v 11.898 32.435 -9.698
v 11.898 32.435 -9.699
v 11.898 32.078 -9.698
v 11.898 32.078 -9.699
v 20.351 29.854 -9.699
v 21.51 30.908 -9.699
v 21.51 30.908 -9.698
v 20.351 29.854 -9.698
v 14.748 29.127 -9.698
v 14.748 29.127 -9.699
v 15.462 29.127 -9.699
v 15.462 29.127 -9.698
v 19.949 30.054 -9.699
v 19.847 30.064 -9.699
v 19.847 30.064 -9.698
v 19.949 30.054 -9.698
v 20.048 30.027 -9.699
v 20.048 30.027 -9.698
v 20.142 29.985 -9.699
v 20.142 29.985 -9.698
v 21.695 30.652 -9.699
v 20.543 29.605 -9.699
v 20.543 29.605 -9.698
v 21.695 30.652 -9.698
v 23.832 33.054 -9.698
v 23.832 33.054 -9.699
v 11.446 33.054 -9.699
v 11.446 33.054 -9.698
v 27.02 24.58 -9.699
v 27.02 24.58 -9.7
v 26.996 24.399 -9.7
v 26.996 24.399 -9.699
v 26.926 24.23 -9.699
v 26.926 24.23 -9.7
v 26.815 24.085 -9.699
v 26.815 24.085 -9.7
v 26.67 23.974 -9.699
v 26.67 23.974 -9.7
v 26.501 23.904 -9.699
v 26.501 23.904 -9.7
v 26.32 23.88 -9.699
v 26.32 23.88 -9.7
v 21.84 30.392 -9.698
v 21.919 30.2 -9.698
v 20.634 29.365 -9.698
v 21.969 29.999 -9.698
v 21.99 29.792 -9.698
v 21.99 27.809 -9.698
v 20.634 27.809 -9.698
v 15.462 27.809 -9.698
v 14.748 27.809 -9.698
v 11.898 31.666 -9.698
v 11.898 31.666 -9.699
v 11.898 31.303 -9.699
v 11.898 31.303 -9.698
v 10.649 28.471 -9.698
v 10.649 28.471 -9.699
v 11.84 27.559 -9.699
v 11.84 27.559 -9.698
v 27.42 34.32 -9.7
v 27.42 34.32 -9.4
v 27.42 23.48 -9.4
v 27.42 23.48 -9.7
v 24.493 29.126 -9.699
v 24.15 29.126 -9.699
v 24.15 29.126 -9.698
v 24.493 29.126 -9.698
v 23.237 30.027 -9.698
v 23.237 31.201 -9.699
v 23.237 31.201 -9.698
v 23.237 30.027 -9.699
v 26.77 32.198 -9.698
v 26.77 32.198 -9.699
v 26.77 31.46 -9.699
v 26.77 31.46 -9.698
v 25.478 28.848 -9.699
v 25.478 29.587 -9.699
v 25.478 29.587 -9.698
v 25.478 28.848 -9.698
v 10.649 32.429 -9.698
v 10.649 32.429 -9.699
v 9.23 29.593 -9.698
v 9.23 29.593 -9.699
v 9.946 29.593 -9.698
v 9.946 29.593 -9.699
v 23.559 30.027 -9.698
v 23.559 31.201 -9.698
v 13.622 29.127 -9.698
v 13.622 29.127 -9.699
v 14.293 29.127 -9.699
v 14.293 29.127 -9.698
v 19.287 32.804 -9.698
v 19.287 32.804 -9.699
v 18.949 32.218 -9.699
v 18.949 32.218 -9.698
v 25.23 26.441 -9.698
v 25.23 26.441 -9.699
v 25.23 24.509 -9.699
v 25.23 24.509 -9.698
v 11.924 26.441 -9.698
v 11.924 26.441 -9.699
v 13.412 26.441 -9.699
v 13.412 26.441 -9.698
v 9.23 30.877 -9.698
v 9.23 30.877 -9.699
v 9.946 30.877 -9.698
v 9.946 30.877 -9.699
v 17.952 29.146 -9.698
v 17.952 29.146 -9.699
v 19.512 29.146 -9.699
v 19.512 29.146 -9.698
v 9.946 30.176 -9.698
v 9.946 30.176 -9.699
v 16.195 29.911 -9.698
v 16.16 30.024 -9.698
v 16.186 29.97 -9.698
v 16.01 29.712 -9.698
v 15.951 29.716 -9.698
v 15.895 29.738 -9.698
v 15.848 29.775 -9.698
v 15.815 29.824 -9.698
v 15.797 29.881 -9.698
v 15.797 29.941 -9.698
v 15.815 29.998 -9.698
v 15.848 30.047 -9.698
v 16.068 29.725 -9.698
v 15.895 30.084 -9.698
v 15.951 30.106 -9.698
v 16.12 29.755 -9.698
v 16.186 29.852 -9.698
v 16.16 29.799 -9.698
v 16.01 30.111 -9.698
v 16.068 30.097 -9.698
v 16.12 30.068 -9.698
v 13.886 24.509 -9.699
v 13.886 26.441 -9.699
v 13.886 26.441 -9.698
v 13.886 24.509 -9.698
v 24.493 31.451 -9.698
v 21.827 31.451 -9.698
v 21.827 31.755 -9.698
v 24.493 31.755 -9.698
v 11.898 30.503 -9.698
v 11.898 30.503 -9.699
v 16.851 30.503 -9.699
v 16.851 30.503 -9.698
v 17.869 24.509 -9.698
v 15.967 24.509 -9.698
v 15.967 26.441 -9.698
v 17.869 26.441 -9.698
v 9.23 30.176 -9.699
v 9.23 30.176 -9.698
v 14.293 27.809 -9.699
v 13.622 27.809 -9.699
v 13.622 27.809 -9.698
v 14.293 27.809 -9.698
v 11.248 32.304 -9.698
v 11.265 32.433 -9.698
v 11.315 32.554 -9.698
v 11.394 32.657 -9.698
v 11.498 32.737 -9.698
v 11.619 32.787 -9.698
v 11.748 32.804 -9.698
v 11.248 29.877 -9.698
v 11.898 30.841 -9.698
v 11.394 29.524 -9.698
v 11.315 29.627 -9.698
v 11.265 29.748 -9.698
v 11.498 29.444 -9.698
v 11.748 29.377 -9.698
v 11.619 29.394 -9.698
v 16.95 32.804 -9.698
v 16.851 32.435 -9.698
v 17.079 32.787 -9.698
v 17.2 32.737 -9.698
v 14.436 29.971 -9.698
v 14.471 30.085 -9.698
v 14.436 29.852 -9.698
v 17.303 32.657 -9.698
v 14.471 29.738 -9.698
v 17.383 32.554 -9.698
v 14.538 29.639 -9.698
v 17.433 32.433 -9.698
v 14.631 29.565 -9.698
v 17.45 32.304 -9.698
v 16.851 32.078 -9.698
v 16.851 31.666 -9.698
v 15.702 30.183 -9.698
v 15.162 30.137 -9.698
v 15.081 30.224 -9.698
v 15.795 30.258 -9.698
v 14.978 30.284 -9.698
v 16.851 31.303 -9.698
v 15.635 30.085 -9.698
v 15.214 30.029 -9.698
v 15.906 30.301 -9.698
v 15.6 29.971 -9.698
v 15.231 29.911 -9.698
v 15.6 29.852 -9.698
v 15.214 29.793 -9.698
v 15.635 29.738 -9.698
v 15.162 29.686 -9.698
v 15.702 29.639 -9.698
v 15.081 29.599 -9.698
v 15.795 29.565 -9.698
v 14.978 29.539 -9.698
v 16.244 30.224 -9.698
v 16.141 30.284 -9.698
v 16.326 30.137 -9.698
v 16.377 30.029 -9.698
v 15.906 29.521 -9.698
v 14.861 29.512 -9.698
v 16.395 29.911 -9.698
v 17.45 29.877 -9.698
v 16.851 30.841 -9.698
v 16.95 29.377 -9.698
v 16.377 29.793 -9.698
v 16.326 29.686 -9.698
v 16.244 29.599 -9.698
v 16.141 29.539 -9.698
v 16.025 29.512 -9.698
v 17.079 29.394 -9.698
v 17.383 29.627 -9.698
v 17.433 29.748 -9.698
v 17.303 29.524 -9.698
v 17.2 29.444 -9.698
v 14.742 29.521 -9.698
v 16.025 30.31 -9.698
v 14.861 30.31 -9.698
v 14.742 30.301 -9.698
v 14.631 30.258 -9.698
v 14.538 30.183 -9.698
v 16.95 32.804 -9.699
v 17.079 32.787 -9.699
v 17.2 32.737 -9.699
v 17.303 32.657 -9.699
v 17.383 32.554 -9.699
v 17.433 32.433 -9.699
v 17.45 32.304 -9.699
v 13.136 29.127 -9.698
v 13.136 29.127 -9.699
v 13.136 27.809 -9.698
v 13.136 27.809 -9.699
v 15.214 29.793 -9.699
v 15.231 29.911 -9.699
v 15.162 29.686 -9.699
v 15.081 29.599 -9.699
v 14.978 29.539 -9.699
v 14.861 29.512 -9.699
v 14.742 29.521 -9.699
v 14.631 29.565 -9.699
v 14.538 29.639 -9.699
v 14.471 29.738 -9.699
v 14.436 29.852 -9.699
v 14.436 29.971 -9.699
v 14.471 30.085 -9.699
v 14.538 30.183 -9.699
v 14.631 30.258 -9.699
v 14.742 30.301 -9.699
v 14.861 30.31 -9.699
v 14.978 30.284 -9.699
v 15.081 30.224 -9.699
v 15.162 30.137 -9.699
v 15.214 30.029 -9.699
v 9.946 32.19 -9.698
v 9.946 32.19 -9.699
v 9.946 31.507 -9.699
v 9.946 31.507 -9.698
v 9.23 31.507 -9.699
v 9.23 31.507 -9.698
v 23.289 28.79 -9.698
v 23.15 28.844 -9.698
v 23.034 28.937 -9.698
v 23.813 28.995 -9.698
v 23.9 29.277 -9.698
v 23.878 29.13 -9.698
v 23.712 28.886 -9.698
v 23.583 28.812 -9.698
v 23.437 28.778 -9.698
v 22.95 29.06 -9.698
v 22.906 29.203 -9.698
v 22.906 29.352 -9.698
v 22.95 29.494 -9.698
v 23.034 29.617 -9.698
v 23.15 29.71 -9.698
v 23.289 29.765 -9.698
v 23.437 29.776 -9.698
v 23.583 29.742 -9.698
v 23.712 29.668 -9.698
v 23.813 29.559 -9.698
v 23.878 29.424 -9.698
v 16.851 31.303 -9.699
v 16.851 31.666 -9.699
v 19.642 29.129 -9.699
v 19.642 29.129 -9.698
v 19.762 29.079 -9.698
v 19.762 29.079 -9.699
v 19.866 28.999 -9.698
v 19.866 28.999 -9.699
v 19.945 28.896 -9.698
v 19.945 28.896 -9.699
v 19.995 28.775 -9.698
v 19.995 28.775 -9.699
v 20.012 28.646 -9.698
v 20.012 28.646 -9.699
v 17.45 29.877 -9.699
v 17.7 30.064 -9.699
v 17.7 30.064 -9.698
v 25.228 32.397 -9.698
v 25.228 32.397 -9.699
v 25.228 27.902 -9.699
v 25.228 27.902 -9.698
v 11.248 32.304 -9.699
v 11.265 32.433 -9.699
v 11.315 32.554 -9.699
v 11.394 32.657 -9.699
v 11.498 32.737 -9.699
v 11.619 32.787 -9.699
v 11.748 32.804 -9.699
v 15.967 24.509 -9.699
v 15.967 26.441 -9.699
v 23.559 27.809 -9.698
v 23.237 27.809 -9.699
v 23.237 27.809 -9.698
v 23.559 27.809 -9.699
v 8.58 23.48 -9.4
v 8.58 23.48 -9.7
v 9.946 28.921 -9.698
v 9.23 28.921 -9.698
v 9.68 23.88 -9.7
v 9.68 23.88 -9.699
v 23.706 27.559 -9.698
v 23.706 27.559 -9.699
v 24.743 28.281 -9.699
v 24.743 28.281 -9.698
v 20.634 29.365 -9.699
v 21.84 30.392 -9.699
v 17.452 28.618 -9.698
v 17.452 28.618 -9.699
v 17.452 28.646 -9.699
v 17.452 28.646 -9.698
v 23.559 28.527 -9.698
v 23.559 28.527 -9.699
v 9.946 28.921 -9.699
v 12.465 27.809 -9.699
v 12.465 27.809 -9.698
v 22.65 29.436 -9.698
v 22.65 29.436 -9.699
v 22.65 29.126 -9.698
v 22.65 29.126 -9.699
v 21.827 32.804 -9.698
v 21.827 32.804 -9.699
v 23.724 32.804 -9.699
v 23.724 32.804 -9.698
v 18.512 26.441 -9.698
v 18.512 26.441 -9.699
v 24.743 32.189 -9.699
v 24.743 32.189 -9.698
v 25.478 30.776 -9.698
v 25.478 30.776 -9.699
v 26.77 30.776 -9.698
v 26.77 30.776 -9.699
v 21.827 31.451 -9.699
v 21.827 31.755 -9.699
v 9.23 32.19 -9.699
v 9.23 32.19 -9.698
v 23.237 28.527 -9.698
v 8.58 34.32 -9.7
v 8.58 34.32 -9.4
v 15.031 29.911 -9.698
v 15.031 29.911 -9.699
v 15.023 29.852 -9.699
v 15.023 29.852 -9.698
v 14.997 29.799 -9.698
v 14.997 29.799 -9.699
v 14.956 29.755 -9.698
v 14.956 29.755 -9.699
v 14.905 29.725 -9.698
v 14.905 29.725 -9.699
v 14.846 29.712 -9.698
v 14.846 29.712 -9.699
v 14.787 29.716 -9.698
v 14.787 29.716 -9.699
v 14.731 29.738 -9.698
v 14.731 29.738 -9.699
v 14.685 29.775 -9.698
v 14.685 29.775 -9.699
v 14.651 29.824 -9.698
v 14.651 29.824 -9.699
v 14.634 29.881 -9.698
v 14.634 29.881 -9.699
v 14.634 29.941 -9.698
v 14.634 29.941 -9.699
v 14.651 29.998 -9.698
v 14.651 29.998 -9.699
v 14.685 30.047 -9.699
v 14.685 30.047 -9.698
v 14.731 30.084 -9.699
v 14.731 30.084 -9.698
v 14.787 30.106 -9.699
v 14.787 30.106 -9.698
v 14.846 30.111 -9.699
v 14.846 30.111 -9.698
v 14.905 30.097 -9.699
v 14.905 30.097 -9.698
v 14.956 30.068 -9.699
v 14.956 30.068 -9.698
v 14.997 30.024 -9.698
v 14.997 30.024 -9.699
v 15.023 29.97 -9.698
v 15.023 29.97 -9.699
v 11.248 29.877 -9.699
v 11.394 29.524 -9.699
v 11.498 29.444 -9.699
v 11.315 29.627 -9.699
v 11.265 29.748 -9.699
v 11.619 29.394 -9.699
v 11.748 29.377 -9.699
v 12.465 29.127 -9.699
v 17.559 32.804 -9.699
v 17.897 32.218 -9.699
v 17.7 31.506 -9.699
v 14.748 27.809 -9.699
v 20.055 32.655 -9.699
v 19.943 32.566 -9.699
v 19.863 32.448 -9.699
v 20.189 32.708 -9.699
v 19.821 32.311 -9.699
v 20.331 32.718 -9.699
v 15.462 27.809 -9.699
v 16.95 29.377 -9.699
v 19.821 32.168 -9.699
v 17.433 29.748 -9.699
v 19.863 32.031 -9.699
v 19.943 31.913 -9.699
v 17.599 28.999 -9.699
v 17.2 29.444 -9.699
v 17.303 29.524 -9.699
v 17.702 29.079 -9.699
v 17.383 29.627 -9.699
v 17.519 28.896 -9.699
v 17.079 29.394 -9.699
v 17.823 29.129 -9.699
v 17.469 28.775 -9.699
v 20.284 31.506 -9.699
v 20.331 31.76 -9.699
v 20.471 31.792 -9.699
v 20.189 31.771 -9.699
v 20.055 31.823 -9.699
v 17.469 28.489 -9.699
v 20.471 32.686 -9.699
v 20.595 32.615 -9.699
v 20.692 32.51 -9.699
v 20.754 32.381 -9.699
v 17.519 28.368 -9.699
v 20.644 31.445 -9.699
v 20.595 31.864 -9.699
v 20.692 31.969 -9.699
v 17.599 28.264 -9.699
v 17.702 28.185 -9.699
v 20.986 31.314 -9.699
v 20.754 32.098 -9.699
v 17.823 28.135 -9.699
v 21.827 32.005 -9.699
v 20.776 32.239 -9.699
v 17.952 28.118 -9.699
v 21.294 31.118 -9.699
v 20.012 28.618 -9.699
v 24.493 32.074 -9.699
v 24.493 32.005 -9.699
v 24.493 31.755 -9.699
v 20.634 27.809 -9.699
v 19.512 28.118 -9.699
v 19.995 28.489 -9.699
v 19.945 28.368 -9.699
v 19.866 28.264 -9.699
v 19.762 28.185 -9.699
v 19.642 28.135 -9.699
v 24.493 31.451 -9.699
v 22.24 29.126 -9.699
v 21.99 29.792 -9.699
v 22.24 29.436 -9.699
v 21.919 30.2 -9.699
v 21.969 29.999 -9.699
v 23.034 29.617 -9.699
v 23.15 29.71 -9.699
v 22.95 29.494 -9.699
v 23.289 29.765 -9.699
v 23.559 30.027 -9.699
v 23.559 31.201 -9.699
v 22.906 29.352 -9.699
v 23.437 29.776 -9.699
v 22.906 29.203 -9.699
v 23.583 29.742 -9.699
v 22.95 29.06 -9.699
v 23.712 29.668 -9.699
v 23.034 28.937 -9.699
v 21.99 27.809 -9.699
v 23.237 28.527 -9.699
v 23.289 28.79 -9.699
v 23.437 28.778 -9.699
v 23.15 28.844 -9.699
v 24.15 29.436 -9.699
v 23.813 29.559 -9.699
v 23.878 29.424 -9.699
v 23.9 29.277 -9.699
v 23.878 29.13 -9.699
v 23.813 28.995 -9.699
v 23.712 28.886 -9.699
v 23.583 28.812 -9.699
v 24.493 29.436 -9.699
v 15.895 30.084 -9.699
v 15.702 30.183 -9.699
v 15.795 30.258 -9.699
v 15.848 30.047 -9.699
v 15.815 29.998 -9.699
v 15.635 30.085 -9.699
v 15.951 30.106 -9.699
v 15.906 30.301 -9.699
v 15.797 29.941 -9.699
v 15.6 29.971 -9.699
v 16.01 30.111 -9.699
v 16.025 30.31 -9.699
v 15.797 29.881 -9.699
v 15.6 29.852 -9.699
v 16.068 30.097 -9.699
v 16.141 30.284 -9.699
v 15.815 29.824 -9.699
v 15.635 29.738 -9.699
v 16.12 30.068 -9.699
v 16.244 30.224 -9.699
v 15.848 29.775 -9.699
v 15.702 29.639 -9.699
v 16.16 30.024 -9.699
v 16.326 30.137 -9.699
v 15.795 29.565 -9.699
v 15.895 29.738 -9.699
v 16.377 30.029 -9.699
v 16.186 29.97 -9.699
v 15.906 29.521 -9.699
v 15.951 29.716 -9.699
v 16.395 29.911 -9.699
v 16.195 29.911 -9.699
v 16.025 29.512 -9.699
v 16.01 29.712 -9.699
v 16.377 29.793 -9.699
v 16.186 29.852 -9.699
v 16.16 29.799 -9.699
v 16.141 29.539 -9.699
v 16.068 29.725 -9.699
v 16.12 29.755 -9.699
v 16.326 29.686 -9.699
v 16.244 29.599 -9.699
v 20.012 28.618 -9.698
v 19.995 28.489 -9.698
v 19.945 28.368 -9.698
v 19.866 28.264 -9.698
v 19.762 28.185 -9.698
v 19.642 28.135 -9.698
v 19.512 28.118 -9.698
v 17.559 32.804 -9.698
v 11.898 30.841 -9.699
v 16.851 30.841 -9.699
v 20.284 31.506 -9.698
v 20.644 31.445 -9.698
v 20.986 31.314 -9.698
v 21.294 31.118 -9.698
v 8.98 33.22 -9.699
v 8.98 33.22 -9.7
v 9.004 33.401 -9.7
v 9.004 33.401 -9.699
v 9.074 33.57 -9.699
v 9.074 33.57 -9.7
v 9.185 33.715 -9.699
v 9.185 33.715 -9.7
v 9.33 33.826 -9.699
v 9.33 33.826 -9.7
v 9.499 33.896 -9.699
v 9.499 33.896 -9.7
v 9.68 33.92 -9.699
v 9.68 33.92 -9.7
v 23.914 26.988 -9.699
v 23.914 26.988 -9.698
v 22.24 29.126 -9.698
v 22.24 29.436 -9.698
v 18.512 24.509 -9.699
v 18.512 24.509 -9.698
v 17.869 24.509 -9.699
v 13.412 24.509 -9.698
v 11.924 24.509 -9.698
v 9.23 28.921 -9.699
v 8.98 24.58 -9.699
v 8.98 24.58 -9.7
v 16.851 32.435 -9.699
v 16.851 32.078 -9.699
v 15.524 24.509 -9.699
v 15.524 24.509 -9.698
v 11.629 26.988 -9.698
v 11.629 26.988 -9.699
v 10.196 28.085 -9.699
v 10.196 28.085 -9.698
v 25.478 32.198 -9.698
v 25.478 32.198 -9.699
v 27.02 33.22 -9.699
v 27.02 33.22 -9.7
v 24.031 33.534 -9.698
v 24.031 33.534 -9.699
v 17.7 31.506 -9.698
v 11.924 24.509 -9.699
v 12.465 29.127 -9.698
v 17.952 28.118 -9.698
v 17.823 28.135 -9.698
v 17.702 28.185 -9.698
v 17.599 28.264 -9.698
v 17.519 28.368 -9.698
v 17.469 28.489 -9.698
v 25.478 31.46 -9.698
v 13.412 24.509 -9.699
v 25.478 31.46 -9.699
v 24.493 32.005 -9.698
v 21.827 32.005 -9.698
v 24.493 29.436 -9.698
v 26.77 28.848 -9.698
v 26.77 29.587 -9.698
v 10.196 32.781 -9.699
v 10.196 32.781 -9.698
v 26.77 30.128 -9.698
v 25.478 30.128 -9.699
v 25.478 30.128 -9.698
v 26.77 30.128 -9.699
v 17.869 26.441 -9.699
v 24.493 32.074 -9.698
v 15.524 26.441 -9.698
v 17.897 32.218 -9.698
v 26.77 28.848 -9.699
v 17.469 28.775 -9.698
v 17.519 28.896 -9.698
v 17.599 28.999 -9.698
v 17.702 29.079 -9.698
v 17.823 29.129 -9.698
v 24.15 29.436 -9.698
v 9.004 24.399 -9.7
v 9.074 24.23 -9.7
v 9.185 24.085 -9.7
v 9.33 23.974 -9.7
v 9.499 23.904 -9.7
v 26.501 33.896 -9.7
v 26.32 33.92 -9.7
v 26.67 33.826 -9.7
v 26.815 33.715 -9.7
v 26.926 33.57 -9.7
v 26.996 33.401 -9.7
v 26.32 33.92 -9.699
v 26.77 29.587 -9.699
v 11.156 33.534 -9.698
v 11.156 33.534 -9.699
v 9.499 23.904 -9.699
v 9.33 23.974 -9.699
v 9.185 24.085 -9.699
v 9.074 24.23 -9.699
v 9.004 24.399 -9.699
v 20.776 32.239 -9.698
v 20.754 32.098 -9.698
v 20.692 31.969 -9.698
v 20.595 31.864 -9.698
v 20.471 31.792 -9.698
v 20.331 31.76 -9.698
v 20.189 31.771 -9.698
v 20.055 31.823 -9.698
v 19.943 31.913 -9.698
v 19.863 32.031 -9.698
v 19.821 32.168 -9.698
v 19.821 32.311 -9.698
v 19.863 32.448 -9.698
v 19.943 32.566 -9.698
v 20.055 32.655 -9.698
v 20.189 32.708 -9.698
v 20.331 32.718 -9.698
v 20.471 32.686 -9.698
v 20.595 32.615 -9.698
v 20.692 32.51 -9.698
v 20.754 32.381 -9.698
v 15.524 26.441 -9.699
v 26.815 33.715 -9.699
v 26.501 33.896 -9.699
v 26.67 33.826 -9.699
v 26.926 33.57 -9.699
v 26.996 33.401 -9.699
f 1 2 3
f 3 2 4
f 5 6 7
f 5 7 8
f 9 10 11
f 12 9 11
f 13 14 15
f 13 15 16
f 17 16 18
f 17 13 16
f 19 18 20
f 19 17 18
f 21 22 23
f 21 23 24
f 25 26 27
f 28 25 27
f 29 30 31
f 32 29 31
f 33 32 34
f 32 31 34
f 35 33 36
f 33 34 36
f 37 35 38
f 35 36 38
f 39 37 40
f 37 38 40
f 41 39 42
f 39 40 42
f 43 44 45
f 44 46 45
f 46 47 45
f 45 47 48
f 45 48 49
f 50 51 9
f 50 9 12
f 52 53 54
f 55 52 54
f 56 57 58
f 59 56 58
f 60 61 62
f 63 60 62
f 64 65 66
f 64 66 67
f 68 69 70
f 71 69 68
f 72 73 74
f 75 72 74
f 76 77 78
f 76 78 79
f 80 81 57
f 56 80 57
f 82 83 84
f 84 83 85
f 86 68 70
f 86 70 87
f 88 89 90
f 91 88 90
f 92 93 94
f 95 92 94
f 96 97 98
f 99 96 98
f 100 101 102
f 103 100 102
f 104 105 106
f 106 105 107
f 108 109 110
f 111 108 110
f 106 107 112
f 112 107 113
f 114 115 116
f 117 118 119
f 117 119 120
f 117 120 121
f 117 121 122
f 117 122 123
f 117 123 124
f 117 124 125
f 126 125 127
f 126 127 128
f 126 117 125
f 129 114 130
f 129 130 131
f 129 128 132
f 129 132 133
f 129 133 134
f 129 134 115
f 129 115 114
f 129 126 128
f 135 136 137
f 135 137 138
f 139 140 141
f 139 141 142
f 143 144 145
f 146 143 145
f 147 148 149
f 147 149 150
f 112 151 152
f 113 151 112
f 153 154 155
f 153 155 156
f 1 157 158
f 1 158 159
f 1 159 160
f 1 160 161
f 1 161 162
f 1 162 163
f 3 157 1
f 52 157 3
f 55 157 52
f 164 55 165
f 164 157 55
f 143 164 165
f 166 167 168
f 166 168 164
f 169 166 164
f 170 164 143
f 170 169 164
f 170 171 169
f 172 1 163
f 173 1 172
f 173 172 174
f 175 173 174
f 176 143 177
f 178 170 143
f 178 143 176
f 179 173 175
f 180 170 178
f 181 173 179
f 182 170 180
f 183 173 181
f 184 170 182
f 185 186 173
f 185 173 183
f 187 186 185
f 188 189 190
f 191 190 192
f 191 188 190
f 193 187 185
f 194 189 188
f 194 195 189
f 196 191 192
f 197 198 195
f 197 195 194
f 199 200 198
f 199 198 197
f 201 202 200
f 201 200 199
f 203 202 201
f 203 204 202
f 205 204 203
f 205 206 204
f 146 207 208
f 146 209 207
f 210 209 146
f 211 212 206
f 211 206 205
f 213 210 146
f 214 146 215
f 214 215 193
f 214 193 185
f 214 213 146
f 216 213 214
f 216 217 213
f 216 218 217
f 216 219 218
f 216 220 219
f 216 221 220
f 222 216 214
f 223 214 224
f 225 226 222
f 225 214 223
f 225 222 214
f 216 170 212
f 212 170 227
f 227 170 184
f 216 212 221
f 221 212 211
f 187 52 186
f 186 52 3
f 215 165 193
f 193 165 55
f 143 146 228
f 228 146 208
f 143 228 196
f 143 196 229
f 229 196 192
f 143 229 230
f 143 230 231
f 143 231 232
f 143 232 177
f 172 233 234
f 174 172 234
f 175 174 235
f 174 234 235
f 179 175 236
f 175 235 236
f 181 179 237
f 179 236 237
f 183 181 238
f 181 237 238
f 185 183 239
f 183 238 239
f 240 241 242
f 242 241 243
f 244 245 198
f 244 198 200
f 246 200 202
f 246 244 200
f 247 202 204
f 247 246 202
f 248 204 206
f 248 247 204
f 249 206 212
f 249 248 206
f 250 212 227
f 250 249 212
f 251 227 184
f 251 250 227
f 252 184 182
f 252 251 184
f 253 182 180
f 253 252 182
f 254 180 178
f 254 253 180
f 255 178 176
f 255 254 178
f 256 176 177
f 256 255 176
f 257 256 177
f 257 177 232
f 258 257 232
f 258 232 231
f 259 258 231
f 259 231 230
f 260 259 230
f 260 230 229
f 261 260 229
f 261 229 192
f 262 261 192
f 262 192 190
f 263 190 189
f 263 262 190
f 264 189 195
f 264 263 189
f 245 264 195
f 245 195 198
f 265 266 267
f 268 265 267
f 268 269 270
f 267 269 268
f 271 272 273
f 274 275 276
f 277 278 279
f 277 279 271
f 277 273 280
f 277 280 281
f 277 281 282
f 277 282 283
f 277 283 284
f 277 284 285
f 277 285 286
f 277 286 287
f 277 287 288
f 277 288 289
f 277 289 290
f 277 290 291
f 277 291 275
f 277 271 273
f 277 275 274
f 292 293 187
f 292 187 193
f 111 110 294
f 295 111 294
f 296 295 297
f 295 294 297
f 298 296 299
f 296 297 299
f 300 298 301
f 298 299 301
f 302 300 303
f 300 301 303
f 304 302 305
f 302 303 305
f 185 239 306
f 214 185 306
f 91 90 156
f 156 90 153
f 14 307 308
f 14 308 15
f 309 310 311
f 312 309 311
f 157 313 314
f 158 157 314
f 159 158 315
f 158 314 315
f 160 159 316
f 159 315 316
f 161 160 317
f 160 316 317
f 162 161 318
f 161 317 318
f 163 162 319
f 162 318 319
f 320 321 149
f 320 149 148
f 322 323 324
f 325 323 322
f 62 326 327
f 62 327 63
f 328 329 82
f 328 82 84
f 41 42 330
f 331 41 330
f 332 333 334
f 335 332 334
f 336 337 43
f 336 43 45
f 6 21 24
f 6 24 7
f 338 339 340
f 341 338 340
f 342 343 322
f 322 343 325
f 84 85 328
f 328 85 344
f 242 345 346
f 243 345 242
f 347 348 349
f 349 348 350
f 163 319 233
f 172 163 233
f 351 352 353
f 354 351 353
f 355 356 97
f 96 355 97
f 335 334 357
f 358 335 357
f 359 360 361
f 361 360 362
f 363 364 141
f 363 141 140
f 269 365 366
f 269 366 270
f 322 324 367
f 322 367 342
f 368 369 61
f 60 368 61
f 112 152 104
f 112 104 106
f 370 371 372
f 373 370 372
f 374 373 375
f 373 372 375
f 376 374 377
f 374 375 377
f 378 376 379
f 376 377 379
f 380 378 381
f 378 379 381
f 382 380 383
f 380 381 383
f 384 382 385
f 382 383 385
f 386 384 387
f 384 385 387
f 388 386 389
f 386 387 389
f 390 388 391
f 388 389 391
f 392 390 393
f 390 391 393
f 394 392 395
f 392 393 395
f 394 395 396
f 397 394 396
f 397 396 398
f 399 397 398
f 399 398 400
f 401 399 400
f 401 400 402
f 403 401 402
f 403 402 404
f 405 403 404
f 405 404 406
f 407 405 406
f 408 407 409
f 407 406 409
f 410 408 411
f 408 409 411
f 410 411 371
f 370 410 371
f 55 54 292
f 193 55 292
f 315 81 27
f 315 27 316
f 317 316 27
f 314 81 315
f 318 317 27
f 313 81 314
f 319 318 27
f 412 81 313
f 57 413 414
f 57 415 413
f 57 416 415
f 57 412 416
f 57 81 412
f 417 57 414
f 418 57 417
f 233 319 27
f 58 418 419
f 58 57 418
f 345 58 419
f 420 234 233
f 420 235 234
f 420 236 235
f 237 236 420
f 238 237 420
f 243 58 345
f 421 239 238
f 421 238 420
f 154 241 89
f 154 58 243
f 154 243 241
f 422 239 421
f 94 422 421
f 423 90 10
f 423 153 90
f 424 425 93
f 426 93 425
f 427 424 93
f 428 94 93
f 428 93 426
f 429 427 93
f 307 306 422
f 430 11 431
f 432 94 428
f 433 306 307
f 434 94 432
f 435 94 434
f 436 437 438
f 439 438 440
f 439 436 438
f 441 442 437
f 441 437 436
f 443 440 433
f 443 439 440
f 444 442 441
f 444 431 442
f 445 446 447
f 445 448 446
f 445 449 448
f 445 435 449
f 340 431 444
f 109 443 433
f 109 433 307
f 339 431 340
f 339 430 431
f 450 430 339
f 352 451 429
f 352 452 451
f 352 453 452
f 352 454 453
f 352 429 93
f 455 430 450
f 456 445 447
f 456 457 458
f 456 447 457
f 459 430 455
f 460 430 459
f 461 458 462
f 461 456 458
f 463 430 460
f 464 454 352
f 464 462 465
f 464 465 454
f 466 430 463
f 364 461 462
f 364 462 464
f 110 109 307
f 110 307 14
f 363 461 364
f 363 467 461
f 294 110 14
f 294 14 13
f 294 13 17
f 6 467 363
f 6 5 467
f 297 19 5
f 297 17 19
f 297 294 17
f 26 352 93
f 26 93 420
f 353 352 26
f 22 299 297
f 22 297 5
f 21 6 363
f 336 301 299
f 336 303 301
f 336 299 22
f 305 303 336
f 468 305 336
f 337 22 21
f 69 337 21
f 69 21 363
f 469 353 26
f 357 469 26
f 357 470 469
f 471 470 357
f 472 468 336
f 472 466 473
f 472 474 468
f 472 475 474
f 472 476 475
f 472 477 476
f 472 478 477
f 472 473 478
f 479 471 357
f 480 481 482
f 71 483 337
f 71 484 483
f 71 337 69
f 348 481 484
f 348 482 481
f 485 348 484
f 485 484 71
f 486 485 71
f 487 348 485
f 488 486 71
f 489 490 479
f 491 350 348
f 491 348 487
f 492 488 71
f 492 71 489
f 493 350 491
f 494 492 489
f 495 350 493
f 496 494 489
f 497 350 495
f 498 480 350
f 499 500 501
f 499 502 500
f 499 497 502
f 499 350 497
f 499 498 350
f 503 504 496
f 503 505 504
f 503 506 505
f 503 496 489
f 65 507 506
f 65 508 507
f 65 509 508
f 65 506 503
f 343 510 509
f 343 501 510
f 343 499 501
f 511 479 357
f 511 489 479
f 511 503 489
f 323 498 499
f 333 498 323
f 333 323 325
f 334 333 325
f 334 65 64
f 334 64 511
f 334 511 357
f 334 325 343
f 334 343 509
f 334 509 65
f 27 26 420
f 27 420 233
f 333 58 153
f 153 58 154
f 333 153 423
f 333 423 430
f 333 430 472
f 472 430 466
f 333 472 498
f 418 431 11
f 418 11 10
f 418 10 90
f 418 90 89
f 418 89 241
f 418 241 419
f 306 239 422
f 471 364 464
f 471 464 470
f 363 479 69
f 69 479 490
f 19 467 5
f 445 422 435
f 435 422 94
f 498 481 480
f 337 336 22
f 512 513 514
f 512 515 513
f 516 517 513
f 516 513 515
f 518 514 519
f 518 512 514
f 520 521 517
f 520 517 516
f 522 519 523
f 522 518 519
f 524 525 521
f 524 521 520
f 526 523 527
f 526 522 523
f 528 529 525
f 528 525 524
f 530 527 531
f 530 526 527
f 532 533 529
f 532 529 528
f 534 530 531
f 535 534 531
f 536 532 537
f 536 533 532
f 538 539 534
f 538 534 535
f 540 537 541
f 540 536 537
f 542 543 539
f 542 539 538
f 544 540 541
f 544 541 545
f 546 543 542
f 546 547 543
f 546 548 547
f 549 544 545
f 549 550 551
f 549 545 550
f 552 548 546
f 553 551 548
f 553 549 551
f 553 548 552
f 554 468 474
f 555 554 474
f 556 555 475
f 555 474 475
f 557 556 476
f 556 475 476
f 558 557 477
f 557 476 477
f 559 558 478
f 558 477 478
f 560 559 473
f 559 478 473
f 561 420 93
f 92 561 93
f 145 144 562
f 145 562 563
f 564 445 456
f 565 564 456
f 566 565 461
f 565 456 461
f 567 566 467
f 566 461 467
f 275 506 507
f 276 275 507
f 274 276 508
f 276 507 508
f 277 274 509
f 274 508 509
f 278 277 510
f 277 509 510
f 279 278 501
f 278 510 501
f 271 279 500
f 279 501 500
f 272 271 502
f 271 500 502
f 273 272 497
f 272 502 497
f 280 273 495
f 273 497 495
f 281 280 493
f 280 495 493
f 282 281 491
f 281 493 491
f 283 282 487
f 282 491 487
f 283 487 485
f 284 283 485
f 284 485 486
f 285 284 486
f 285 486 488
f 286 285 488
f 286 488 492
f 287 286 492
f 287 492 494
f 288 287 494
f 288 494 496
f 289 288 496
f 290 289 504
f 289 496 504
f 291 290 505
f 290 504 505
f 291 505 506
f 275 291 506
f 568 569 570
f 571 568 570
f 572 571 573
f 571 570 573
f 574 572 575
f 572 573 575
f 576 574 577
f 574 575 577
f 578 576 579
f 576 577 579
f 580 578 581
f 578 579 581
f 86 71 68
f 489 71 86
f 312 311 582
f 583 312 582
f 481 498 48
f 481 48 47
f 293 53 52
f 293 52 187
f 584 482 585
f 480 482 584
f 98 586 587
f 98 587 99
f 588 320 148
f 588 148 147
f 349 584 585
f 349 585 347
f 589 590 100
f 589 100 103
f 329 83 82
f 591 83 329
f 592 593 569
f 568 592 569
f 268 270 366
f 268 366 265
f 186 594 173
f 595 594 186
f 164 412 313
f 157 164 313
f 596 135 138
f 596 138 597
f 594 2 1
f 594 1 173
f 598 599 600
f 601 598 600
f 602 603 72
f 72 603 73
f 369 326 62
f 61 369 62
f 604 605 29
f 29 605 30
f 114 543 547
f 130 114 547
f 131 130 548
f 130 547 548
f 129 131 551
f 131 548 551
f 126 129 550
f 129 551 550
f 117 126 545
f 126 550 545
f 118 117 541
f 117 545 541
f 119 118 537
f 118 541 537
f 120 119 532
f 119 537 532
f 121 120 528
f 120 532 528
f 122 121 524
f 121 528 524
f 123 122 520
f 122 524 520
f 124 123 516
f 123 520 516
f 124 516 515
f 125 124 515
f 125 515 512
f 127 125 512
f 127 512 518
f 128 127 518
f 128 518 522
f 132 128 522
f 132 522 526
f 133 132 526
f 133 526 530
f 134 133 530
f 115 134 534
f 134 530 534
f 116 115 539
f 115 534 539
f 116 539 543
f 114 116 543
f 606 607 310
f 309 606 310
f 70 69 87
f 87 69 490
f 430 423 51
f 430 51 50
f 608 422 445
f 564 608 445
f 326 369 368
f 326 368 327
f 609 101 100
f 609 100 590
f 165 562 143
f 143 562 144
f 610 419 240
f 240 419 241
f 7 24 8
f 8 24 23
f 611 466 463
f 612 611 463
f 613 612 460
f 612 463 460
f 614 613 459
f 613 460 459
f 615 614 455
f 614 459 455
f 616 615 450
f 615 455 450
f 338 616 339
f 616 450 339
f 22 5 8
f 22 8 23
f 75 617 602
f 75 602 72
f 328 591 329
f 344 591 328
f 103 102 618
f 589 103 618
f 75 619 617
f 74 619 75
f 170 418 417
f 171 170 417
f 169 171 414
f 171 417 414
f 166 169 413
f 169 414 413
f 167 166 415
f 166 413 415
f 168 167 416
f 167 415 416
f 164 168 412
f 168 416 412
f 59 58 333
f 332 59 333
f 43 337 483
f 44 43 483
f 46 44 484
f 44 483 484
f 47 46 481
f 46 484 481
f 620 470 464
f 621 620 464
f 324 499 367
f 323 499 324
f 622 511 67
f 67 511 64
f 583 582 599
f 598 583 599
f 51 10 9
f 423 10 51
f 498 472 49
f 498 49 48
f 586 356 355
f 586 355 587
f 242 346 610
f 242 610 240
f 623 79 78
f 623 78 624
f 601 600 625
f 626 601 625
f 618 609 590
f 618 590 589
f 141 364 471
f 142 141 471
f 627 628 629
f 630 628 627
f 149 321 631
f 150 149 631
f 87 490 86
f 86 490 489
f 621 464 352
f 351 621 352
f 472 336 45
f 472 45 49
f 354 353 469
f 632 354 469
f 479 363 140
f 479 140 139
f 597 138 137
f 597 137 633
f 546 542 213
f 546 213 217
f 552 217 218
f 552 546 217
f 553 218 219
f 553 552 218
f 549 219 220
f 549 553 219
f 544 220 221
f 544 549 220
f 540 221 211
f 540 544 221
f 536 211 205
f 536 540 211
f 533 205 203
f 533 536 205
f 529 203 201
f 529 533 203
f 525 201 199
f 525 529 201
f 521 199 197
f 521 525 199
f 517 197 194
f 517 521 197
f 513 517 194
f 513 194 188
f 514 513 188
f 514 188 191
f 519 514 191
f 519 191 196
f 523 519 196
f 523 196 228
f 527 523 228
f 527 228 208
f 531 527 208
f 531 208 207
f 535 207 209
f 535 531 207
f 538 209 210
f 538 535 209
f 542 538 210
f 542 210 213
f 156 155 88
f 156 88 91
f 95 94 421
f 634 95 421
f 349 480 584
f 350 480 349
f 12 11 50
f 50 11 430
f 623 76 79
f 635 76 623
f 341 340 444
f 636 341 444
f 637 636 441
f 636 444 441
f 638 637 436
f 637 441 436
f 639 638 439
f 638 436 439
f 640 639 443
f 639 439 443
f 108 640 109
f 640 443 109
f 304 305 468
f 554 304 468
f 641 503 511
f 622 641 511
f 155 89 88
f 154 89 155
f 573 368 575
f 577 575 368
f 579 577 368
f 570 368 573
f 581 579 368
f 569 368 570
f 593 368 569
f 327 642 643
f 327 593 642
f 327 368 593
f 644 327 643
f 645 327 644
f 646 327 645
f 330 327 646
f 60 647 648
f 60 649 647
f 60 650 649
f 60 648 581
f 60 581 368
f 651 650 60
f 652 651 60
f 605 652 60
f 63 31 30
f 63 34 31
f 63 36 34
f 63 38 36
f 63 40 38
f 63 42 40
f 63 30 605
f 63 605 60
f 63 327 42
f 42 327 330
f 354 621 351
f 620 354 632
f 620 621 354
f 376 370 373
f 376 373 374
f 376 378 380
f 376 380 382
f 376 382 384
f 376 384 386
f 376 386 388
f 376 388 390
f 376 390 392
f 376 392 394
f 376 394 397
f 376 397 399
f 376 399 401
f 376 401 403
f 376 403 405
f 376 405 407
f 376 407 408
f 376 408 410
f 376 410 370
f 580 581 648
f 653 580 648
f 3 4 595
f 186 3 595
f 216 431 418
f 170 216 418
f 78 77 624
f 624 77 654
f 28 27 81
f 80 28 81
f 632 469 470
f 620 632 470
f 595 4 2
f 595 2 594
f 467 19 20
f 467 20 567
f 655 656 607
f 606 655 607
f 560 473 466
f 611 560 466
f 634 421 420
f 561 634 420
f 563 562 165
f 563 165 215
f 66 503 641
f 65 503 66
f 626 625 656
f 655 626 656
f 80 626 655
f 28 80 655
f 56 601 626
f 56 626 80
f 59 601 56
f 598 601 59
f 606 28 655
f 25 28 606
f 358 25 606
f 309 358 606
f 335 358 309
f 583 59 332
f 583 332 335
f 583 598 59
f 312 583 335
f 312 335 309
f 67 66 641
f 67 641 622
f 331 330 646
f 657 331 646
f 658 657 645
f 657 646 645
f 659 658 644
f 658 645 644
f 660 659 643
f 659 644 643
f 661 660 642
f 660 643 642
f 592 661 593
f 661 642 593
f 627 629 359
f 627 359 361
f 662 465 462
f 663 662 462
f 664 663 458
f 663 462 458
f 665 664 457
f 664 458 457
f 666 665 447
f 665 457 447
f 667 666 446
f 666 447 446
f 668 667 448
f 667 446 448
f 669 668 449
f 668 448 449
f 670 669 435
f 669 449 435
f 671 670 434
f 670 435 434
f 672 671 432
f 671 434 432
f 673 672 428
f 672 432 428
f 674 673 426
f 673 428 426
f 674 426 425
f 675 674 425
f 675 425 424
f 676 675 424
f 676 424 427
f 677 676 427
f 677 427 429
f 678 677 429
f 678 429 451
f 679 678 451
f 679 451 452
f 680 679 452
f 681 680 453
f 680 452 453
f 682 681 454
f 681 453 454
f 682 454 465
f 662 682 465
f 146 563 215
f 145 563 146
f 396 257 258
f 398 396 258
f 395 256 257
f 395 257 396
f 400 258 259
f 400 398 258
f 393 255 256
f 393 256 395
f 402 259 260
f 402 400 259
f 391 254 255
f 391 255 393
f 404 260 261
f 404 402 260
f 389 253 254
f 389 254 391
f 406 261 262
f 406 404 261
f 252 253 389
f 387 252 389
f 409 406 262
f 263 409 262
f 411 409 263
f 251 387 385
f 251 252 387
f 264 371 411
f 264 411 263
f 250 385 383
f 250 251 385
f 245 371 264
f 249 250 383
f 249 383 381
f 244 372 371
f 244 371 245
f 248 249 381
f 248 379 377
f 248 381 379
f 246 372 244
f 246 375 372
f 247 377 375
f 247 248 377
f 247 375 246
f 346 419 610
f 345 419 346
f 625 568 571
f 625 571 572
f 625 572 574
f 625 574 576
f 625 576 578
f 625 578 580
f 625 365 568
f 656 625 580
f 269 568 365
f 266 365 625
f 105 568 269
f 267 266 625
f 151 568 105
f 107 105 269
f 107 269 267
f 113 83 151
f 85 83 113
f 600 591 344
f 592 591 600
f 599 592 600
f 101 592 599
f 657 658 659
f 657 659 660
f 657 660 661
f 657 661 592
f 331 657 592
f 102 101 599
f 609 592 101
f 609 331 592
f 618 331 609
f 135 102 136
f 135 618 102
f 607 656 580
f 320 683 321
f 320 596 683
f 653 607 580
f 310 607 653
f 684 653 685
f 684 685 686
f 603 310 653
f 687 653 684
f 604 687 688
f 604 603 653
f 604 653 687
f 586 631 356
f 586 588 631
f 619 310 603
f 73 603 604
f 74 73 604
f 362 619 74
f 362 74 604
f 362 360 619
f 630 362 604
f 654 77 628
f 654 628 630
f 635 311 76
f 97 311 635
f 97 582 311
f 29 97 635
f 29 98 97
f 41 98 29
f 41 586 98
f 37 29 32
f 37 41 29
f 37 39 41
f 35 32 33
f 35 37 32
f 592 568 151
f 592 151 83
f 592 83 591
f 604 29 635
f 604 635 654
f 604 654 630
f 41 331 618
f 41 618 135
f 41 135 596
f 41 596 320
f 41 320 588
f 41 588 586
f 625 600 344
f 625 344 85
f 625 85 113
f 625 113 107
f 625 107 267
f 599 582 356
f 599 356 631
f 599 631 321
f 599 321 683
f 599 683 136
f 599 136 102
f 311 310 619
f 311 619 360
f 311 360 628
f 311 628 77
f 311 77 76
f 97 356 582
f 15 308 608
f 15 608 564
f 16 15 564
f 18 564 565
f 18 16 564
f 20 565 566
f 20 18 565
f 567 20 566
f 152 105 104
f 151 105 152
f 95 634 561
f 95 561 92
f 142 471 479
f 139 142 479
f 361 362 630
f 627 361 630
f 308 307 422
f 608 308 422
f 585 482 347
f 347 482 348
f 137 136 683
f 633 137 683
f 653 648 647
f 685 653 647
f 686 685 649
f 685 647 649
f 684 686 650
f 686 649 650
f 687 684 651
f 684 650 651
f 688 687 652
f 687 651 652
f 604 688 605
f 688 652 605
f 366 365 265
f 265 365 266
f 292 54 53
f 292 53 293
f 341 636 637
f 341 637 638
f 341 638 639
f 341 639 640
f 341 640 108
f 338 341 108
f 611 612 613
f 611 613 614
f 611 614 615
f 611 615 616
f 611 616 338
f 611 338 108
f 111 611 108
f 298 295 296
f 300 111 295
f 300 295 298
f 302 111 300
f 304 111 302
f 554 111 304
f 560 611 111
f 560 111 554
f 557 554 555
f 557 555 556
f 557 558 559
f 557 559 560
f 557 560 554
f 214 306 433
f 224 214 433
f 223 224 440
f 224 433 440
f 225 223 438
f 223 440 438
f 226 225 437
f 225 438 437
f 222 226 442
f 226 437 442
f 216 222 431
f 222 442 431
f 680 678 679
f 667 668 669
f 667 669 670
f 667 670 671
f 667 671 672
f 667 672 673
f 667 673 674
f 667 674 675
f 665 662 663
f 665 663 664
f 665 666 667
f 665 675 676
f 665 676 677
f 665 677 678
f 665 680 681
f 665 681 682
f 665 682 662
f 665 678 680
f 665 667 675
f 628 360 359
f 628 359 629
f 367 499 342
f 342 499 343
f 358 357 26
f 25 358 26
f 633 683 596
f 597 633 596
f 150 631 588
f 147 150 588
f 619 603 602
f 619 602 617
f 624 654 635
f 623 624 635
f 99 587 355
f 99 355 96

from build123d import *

# Parameters (mm, degrees)
SKETCH_W        = 18.84
SKETCH_H        = 10.84
PAD_DEPTH       = 0.3
POCKET001_DEPTH = 0.001
SKETCH002_W     = 1.487973
SKETCH002_H     = 1.931914
SKETCH002_W_2   = 1.638274
SKETCH002_W_3   = 1.9013
SKETCH002_W_4   = 6.718428
SKETCH002_W_5   = 0.715697
SKETCH002_H_2   = 0.671803
SKETCH002_H_3   = 0.701418
SKETCH002_H_4   = 0.682957
SKETCH002_W_6   = 1.291878
SKETCH002_H_5   = 0.738334
SKETCH002_H_6   = 0.6481
POCKET002_DEPTH = 0.001
SKETCH003_R     = 0.480256
SKETCH003_R_2   = 0.5
SKETCH003_W     = 0.670654
SKETCH003_H     = 1.317879
SKETCH003_W_2   = 0.670653
SKETCH003_W_3   = 0.713723
SKETCH003_R_3   = 0.4
SKETCH003_W_4   = 4.952994
SKETCH003_H_2   = 0.338404
SKETCH003_H_3   = 0.363017
SKETCH003_H_4   = 0.356861
SKETCH003_W_5   = 0.41034
SKETCH003_H_5   = 0.309326
SKETCH003_W_6   = 0.32158
SKETCH003_H_6   = 1.173725
SKETCH003_W_7   = 0.342889
SKETCH003_H_7   = 0.717704
SKETCH003_W_8   = 2.66577
SKETCH003_H_8   = 0.304358
SKETCH003_R_4   = 0.2
POCKET003_DEPTH = 0.001


with BuildPart() as part:
    # Sketch (on Face1 of Binder) → Pad (new body)
    with BuildSketch(Plane(origin=(0, 0, -9.4), x_dir=(1, 0, 0), z_dir=(0, 0, -1))):
        with Locations((18, -28.9)):
            Rectangle(SKETCH_W, SKETCH_H)
    extrude(amount=PAD_DEPTH)

    # Sketch001 (on Face6 of Pad) → Pocket001 (cut)
    with BuildSketch(Plane(origin=(0, 0, -9.7), x_dir=(1, 0, 0), z_dir=(0, 0, -1))):
        with BuildLine():
            Line((8.98, -24.58), (8.98, -33.22))
            ThreePointArc((8.98, -33.22), (9.185025, -33.714975), (9.68, -33.92))
            Line((9.68, -33.92), (26.32, -33.92))
            ThreePointArc((26.32, -33.92), (26.814975, -33.714975), (27.02, -33.22))
            Line((27.02, -33.22), (27.02, -24.58))
            ThreePointArc((27.02, -24.58), (26.814975, -24.085025), (26.32, -23.88))
            Line((26.32, -23.88), (9.68, -23.88))
            ThreePointArc((9.68, -23.88), (9.185025, -24.085025), (8.98, -24.58))
        make_face()
    extrude(amount=-POCKET001_DEPTH, mode=Mode.SUBTRACT)

    # Sketch002 (on Face15 of Pocket001) → Pocket002 (cut)
    with BuildSketch(Plane(origin=(0, 0, -9.699), x_dir=(1, 0, 0), z_dir=(0, 0, -1))):
        with Locations((12.668276, -25.475131)):
            Rectangle(SKETCH002_W, SKETCH002_H)
        with Locations((14.704847, -25.475131)):
            Rectangle(SKETCH002_W_2, SKETCH002_H)
        with Locations((16.91802, -25.475131)):
            Rectangle(SKETCH002_W_3, SKETCH002_H)
        with Locations((21.871041, -25.475131)):
            Rectangle(SKETCH002_W_4, SKETCH002_H)
        with Locations((9.587848, -29.256862)):
            Rectangle(SKETCH002_W_5, SKETCH002_H_2)
        with Locations((9.587848, -30.52661)):
            Rectangle(SKETCH002_W_5, SKETCH002_H_3)
        with Locations((9.587848, -31.848242)):
            Rectangle(SKETCH002_W_5, SKETCH002_H_4)
        with Locations((26.124061, -29.217495)):
            Rectangle(SKETCH002_W_6, SKETCH002_H_5)
        with Locations((26.124061, -30.452157)):
            Rectangle(SKETCH002_W_6, SKETCH002_H_6)
        with Locations((26.124061, -31.829052)):
            Rectangle(SKETCH002_W_6, SKETCH002_H_5)
        Polygon((10.195697, -28.084638), (10.195697, -32.780541), (11.156489, -33.534092), (24.030916, -33.534092), (25.228122, -32.397384), (25.228122, -27.902392), (23.914452, -26.988171), (11.628569, -26.988171), align=None)
        Polygon((10.649023, -28.470931), (11.840284, -27.55935), (23.706315, -27.55935), (24.742934, -28.280763), (24.742934, -32.189171), (23.832297, -33.053791), (11.445835, -33.053791), (10.649023, -32.428849), align=None, mode=Mode.SUBTRACT)
    extrude(amount=-POCKET002_DEPTH, mode=Mode.SUBTRACT)

    # Sketch003 (on Face83 of Pocket002) → Pocket003 (cut)
    with BuildSketch(Plane(origin=(0, 0, -9.699), x_dir=(1, 0, 0), z_dir=(0, 0, -1))):
        with Locations((20.29553, -32.239323)):
            Circle(SKETCH003_R)
        with Locations((23.400045, -29.277054)):
            Circle(SKETCH003_R_2)
        with Locations((12.800486, -28.468289)):
            Rectangle(SKETCH003_W, SKETCH003_H)
        with Locations((13.957209, -28.468289)):
            Rectangle(SKETCH003_W_2, SKETCH003_H)
        with Locations((15.104702, -28.468289)):
            Rectangle(SKETCH003_W_3, SKETCH003_H)
        with BuildLine():
            Line((11.248014, -29.877229), (11.248014, -32.303791))
            ThreePointArc((11.248014, -32.303791), (11.394461, -32.657344), (11.748014, -32.803791))
            Line((11.748014, -32.803791), (16.949894, -32.803791))
            ThreePointArc((16.949894, -32.803791), (17.303447, -32.657344), (17.449894, -32.303791))
            Line((17.449894, -32.303791), (17.449894, -29.877229))
            ThreePointArc((17.449894, -29.877229), (17.303447, -29.523676), (16.949894, -29.377229))
            Line((16.949894, -29.377229), (11.748014, -29.377229))
            ThreePointArc((11.748014, -29.377229), (11.394461, -29.523676), (11.248014, -29.877229))
        make_face()
        with Locations((14.831495, -29.911236)):
            Circle(SKETCH003_R_3, mode=Mode.SUBTRACT)
        with Locations((15.995043, -29.911236)):
            Circle(SKETCH003_R_3, mode=Mode.SUBTRACT)
        with Locations((14.374179, -30.672177)):
            Rectangle(SKETCH003_W_4, SKETCH003_H_2, mode=Mode.SUBTRACT)
        with Locations((14.374179, -31.484345)):
            Rectangle(SKETCH003_W_4, SKETCH003_H_3, mode=Mode.SUBTRACT)
        with Locations((14.374179, -32.256521)):
            Rectangle(SKETCH003_W_4, SKETCH003_H_4, mode=Mode.SUBTRACT)
        with BuildLine():
            Line((17.699894, -30.064499), (17.699894, -31.506425))
            Line((17.699894, -31.506425), (20.283536, -31.506425))
            ThreePointArc((20.283536, -31.506425), (20.818146, -31.388075), (21.294236, -31.117605))
            Line((20.141929, -29.985008), (21.294236, -31.117605))
            ThreePointArc((19.846798, -30.064499), (19.999169, -30.042595), (20.141929, -29.985008))
            Line((17.699894, -30.064499), (19.846798, -30.064499))
        make_face()
        Polygon((20.351476, -29.854358), (20.542978, -29.604508), (21.694934, -30.651904), (21.509854, -30.907592), align=None)
        with BuildLine():
            Line((20.63387, -27.80935), (21.989705, -27.80935))
            Line((21.989705, -27.80935), (21.989705, -29.792339))
            ThreePointArc((21.840453, -30.391624), (21.947748, -30.100118), (21.989705, -29.792339))
            Line((21.840453, -30.391624), (20.63387, -29.364835))
            Line((20.63387, -29.364835), (20.63387, -27.80935))
        make_face()
        with BuildLine():
            Line((17.452358, -28.618032), (17.452358, -28.645678))
            ThreePointArc((17.452358, -28.645678), (17.598805, -28.999231), (17.952358, -29.145678))
            Line((17.952358, -29.145678), (19.5124, -29.145678))
            ThreePointArc((19.5124, -29.145678), (19.865953, -28.999231), (20.0124, -28.645678))
            Line((20.0124, -28.645678), (20.0124, -28.618032))
            ThreePointArc((20.0124, -28.618032), (19.865953, -28.264479), (19.5124, -28.118032))
            Line((19.5124, -28.118032), (17.952358, -28.118032))
            ThreePointArc((17.952358, -28.118032), (17.598805, -28.264479), (17.452358, -28.618032))
        make_face()
        Polygon((17.896748, -32.217945), (17.55851, -32.803791), (19.287113, -32.803791), (18.948875, -32.217945), align=None)
        with Locations((22.444875, -29.280899)):
            Rectangle(SKETCH003_W_5, SKETCH003_H_5)
        with Locations((23.397809, -30.613916)):
            Rectangle(SKETCH003_W_6, SKETCH003_H_6)
        with Locations((24.321489, -29.280899)):
            Rectangle(SKETCH003_W_7, SKETCH003_H_5)
        with Locations((23.397809, -28.168202)):
            Rectangle(SKETCH003_W_6, SKETCH003_H_7)
        with Locations((23.160049, -31.602958)):
            Rectangle(SKETCH003_W_8, SKETCH003_H_8)
        Polygon((21.827164, -32.005137), (21.827164, -32.803791), (23.723867, -32.803791), (24.492934, -32.073588), (24.492934, -32.005137), align=None)
        with Locations((14.831495, -29.911236)):
            Circle(SKETCH003_R_4)
        with Locations((15.995043, -29.911236)):
            Circle(SKETCH003_R_4)
    extrude(amount=-POCKET003_DEPTH, mode=Mode.SUBTRACT)


solid = part.part
